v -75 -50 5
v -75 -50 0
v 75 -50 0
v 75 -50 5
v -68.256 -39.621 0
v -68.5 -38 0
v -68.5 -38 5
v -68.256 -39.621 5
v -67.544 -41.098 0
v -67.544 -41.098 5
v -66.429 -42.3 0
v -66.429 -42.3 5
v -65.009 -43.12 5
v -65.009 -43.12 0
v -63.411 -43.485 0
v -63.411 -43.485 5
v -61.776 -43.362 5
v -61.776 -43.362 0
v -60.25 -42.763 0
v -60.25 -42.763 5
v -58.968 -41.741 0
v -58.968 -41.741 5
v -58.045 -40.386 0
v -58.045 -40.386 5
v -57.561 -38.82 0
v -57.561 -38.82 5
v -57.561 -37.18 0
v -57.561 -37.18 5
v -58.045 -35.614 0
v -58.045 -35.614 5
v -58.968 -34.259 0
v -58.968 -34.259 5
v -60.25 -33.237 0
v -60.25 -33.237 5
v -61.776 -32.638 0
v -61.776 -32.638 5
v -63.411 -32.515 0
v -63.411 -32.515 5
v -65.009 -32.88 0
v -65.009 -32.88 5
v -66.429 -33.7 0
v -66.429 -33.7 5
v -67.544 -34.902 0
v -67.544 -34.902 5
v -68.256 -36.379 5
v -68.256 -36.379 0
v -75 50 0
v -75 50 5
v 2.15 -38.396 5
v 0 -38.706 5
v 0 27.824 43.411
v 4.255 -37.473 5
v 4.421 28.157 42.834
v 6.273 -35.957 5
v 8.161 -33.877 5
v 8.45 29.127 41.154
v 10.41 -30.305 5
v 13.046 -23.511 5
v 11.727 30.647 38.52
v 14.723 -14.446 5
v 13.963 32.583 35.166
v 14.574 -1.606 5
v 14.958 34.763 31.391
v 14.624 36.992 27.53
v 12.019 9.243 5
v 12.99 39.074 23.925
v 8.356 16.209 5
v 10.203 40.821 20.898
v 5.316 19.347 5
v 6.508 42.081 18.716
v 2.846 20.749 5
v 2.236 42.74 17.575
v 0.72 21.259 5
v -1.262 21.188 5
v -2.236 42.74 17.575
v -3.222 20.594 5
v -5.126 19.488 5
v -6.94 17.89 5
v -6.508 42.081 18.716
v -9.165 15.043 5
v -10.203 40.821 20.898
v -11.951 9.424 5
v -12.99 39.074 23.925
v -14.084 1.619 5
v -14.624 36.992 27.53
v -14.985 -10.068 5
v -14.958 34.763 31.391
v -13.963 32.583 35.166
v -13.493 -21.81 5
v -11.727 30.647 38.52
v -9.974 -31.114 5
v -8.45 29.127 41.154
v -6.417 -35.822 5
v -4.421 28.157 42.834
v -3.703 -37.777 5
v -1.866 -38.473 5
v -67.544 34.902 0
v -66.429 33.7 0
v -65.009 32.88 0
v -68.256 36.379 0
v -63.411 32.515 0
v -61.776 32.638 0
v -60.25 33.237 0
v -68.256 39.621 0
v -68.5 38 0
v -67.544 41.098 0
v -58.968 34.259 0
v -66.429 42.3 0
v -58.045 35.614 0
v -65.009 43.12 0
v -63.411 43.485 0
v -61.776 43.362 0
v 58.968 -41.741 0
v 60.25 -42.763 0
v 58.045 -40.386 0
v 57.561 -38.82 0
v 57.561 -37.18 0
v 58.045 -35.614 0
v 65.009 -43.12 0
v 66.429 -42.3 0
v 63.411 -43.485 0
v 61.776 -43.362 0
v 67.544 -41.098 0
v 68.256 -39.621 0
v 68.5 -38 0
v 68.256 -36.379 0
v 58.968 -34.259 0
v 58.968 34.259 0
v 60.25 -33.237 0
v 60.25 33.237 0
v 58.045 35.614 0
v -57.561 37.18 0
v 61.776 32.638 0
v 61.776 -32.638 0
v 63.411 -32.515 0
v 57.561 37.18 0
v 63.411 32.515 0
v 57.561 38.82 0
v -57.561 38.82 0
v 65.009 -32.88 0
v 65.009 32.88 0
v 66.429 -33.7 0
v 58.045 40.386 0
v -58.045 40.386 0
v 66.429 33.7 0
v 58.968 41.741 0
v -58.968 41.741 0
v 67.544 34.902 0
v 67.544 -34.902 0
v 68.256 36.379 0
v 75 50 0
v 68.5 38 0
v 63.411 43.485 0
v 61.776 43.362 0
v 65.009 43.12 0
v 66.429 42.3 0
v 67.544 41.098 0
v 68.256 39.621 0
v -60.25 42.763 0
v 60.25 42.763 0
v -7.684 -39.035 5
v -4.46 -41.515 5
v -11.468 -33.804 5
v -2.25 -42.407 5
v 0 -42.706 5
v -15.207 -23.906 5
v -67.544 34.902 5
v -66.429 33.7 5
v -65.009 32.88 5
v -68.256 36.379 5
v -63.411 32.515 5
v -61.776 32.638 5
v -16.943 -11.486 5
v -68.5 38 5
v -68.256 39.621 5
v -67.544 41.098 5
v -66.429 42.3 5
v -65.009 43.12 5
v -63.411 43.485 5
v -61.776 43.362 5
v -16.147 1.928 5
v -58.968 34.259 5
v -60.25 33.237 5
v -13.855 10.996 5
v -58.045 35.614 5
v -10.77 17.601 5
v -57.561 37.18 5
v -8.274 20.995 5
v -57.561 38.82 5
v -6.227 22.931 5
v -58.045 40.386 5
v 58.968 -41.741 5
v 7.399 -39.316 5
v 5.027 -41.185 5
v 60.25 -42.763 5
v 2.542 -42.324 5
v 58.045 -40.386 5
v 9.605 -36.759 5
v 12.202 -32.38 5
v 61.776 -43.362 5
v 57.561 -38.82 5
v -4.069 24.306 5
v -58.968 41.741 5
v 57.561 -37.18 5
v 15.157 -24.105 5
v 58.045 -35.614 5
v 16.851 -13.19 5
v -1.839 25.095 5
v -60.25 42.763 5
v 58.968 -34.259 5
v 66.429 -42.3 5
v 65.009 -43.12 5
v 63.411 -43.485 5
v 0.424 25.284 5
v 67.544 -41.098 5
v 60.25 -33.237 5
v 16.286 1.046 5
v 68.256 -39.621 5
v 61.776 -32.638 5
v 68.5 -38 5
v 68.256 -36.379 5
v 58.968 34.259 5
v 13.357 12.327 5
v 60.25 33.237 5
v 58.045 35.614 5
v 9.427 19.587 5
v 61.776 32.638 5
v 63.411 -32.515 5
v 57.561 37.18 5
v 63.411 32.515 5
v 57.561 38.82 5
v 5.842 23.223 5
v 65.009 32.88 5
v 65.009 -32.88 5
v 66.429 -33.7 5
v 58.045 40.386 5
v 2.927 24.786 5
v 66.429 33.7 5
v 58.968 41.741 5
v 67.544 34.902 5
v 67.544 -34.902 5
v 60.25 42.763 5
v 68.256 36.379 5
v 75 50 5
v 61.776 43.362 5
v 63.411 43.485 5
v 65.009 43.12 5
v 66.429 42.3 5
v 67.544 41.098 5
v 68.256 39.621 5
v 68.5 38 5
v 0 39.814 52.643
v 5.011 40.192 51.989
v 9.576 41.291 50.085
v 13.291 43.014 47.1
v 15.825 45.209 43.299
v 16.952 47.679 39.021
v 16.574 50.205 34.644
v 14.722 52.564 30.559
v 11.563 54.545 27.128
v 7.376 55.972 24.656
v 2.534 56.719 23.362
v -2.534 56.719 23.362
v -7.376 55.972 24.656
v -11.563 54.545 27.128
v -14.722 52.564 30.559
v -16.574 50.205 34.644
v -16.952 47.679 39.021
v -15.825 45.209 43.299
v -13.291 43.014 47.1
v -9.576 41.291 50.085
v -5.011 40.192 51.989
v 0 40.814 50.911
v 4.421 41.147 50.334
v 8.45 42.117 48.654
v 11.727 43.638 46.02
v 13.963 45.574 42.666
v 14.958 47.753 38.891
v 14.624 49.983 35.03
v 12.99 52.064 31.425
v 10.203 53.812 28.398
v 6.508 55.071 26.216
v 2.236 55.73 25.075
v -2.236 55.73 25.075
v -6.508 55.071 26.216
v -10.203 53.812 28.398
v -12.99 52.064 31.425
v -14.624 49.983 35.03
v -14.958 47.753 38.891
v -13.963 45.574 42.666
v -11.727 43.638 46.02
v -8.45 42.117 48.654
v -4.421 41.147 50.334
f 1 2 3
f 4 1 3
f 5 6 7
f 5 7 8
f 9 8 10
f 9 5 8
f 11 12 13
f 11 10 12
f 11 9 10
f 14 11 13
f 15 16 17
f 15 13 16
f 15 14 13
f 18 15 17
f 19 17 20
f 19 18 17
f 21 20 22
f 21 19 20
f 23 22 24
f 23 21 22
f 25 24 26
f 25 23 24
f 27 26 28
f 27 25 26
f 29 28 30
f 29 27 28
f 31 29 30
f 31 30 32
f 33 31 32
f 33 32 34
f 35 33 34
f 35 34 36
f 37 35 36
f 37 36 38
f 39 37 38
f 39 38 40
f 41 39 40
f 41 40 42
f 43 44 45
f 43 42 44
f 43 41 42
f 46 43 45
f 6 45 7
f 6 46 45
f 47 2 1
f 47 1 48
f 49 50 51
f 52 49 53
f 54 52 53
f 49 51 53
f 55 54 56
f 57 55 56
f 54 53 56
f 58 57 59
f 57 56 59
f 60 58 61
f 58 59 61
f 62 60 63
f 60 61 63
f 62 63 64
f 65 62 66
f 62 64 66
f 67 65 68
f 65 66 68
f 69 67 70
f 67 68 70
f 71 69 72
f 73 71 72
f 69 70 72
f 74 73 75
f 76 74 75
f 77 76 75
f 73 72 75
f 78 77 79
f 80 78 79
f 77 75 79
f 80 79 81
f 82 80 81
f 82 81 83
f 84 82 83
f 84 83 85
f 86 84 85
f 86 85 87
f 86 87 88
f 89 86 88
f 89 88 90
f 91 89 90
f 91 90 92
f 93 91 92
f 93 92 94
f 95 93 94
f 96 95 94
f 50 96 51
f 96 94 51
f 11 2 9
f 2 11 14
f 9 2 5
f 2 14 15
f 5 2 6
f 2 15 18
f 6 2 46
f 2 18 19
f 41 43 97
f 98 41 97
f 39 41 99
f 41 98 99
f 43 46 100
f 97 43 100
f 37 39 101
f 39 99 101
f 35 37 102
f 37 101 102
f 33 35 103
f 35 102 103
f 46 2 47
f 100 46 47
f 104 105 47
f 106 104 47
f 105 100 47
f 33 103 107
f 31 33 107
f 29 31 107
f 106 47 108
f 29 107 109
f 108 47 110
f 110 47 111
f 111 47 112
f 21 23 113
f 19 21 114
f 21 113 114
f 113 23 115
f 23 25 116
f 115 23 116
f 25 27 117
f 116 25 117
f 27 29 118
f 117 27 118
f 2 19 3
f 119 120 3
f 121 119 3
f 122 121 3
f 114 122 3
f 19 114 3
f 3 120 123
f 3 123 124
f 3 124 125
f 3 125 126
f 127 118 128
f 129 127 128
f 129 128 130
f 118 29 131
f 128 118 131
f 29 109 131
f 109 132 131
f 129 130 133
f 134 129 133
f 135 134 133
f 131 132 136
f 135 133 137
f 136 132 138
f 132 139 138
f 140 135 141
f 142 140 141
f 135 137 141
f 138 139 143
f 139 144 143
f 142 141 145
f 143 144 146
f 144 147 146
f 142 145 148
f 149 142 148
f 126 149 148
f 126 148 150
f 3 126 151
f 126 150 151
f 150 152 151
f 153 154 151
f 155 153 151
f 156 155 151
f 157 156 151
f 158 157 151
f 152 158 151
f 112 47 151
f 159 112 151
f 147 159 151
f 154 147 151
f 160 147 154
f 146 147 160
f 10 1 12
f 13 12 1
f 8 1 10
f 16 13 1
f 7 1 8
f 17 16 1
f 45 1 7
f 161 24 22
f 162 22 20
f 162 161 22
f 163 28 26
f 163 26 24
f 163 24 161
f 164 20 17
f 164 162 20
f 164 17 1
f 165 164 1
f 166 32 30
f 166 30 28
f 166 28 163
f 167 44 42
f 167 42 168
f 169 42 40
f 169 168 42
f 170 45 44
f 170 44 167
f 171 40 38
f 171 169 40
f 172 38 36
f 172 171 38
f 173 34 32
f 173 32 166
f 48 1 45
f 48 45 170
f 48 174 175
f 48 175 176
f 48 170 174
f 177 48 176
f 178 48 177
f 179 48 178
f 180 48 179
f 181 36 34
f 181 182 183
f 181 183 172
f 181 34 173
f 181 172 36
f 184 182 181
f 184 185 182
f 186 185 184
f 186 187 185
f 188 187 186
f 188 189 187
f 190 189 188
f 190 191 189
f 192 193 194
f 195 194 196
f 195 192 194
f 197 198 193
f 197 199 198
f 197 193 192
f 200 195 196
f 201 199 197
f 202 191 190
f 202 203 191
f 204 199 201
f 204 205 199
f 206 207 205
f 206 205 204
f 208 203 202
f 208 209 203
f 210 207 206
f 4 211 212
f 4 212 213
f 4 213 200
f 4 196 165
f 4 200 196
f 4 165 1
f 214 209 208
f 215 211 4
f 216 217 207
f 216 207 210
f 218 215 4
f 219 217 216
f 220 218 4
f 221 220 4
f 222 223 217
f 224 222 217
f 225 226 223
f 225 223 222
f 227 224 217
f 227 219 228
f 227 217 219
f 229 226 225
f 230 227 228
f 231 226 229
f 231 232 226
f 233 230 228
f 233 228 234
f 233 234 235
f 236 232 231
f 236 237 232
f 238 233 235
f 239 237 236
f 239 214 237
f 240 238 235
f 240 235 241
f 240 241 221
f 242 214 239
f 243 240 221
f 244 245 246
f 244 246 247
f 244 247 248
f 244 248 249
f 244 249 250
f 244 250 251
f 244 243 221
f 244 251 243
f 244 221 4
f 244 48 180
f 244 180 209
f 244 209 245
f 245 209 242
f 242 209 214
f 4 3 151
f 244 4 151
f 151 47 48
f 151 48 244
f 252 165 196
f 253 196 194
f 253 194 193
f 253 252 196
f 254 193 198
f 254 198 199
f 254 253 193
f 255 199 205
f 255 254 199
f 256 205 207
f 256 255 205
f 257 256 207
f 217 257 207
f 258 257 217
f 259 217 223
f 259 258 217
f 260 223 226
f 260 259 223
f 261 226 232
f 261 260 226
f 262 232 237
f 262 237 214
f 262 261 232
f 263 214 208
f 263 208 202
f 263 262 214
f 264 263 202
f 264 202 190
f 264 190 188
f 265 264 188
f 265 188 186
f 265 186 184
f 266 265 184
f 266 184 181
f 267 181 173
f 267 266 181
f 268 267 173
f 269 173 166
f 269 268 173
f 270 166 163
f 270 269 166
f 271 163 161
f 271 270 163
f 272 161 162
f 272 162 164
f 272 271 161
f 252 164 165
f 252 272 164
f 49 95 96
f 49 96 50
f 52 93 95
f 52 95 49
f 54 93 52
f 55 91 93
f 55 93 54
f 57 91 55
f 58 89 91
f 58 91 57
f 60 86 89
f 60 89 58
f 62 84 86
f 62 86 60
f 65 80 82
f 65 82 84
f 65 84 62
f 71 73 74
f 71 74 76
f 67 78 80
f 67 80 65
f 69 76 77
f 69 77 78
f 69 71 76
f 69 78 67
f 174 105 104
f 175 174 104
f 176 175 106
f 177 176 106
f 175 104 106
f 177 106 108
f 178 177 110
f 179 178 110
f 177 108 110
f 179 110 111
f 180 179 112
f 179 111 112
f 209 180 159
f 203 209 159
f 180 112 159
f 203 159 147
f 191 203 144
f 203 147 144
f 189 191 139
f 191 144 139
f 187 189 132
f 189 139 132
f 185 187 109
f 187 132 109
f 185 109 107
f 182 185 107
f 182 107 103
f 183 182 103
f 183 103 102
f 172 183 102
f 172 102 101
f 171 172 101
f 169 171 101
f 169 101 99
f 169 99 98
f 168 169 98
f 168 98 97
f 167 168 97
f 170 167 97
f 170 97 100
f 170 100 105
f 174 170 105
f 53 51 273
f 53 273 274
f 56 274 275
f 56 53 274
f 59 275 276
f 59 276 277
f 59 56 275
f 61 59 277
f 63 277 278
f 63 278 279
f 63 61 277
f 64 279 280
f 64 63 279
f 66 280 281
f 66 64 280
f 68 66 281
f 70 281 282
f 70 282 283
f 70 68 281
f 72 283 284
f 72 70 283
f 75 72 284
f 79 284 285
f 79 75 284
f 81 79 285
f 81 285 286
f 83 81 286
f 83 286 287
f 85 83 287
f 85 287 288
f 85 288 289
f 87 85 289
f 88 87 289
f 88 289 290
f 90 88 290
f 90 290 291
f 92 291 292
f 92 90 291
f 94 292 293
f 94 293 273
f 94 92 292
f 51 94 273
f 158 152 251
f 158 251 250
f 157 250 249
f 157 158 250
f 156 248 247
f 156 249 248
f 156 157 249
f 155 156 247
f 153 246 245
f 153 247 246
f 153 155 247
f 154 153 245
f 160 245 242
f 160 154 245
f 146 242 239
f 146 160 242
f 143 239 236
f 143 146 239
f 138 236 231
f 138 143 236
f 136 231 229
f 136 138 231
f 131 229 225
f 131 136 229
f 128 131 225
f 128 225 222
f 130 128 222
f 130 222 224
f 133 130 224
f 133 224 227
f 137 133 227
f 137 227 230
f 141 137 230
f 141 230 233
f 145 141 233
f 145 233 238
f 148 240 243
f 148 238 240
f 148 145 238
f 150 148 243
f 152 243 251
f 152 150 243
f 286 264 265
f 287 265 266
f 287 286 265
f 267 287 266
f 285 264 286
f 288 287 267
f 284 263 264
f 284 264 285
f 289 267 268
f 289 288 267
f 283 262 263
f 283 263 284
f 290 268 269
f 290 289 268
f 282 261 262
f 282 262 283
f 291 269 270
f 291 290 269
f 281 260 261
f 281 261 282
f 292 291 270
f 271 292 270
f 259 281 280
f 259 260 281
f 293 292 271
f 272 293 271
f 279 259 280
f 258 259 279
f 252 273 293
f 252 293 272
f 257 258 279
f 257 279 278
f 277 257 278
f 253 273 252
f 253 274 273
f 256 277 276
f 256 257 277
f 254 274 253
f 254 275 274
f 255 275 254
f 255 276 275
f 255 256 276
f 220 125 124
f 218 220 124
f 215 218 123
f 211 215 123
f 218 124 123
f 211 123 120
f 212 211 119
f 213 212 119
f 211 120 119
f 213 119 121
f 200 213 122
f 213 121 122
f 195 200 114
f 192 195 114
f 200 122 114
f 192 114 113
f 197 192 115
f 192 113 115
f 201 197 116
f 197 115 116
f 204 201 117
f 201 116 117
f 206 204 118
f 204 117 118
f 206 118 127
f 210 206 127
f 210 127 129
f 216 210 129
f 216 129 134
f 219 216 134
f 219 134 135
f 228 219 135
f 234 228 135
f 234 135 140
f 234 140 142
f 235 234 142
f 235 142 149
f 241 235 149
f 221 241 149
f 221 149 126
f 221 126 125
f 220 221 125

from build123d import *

# Parameters (mm, degrees)
SZKIC1_W                                = 150
SZKIC1_H                                = 100
DODANIE_WYCI_GNI_CIE1_DEPTH             = 5
OTW_R_POD_RUB_M101_D                    = 11
LUSTRO1_AT_THE_SECOND_PLANE_COPY_1_D    = 11
SZKIC4_R                                = 17
SZKIC4_R_2                              = 15
DODANIE_WYCI_GNI_CIE2_DEPTH             = 15
DODANIE_WYCI_GNI_CIE2_DIRECTION_2_REACH = 91.103


with BuildPart() as part:
    # Szkic1 → Dodanie-wyciągnięcie1 (new body)
    with BuildSketch(Plane.XY):
        Rectangle(SZKIC1_W, SZKIC1_H)
    extrude(amount=DODANIE_WYCI_GNI_CIE1_DEPTH)

    # Otwór pod śrubę M101 (through all)
    with Locations(Plane.XY.offset(5)):
        with Locations((-63, 38)):
            otw_r_pod_rub_m101 = Hole(OTW_R_POD_RUB_M101_D / 2)

    # Lustro1: Otwór pod śrubę M101 across plane
    add(otw_r_pod_rub_m101.mirror(Plane.ZX), mode=Mode.SUBTRACT)

    # Lustro1 at the second plane: Otwór pod śrubę M101 across plane
    add(otw_r_pod_rub_m101.mirror(Plane(origin=(0, 0, 0), x_dir=(0, 0, 1), z_dir=(1, 0, 0))), mode=Mode.SUBTRACT)

    # Lustro1 at the second plane copy 1 (through all)
    with Locations(Plane(origin=(0, 0, 5), x_dir=(-1, 0, 0), z_dir=(0, 0, 1))):
        with Locations((-63, 38)):
            Hole(LUSTRO1_AT_THE_SECOND_PLANE_COPY_1_D / 2)

    # Szkic4 → Dodanie-wyciągnięcie2 (add)
    with BuildSketch(Plane(origin=(0, 39.665063509, 22.900635095), x_dir=(-1, 0, 0), z_dir=(0, 0.866025404, 0.5))):
        with Locations(Location((0, 8.683075721, 0), (0, 0, 90))):  # turned: the seam where the file's is
            Circle(SZKIC4_R)
        with Locations(Location((0, 8.683075721, 0), (0, 0, 90))):  # turned: the seam where the file's is
            Circle(SZKIC4_R_2, mode=Mode.SUBTRACT)
    extrude(amount=DODANIE_WYCI_GNI_CIE2_DEPTH)

    # Dodanie-wyciągnięcie2 direction 2: up to this face of the body (flat: up to its plane)
    dodanie_wyci_gni_cie2_direction_2_end = Plane(part.part.faces().sort_by_distance((0, 0, 5))[0])
    # Szkic4 → Dodanie-wyciągnięcie2 direction 2 (add, up to the picked face)
    with BuildSketch(Plane(origin=(0, 39.665063509, 22.900635095), x_dir=(-1, 0, 0), z_dir=(0, 0.866025404, 0.5)), mode=Mode.PRIVATE) as dodanie_wyci_gni_cie2_direction_2_sk1:
        with Locations(Location((0, 8.683075721, 0), (0, 0, 90))):  # turned: the seam where the file's is
            Circle(SZKIC4_R)
        with Locations(Location((0, 8.683075721, 0), (0, 0, 90))):  # turned: the seam where the file's is
            Circle(SZKIC4_R_2, mode=Mode.SUBTRACT)
    dodanie_wyci_gni_cie2_direction_2_tool1 = split(extrude(dodanie_wyci_gni_cie2_direction_2_sk1.sketch, amount=-DODANIE_WYCI_GNI_CIE2_DIRECTION_2_REACH, mode=Mode.PRIVATE), bisect_by=dodanie_wyci_gni_cie2_direction_2_end, keep=Keep.BOTH, mode=Mode.PRIVATE)
    add(dodanie_wyci_gni_cie2_direction_2_tool1.solids().sort_by(Axis((0, 43.583109, 16.114381), (0, -0.866025404, -0.5)))[0])


solid = part.part
